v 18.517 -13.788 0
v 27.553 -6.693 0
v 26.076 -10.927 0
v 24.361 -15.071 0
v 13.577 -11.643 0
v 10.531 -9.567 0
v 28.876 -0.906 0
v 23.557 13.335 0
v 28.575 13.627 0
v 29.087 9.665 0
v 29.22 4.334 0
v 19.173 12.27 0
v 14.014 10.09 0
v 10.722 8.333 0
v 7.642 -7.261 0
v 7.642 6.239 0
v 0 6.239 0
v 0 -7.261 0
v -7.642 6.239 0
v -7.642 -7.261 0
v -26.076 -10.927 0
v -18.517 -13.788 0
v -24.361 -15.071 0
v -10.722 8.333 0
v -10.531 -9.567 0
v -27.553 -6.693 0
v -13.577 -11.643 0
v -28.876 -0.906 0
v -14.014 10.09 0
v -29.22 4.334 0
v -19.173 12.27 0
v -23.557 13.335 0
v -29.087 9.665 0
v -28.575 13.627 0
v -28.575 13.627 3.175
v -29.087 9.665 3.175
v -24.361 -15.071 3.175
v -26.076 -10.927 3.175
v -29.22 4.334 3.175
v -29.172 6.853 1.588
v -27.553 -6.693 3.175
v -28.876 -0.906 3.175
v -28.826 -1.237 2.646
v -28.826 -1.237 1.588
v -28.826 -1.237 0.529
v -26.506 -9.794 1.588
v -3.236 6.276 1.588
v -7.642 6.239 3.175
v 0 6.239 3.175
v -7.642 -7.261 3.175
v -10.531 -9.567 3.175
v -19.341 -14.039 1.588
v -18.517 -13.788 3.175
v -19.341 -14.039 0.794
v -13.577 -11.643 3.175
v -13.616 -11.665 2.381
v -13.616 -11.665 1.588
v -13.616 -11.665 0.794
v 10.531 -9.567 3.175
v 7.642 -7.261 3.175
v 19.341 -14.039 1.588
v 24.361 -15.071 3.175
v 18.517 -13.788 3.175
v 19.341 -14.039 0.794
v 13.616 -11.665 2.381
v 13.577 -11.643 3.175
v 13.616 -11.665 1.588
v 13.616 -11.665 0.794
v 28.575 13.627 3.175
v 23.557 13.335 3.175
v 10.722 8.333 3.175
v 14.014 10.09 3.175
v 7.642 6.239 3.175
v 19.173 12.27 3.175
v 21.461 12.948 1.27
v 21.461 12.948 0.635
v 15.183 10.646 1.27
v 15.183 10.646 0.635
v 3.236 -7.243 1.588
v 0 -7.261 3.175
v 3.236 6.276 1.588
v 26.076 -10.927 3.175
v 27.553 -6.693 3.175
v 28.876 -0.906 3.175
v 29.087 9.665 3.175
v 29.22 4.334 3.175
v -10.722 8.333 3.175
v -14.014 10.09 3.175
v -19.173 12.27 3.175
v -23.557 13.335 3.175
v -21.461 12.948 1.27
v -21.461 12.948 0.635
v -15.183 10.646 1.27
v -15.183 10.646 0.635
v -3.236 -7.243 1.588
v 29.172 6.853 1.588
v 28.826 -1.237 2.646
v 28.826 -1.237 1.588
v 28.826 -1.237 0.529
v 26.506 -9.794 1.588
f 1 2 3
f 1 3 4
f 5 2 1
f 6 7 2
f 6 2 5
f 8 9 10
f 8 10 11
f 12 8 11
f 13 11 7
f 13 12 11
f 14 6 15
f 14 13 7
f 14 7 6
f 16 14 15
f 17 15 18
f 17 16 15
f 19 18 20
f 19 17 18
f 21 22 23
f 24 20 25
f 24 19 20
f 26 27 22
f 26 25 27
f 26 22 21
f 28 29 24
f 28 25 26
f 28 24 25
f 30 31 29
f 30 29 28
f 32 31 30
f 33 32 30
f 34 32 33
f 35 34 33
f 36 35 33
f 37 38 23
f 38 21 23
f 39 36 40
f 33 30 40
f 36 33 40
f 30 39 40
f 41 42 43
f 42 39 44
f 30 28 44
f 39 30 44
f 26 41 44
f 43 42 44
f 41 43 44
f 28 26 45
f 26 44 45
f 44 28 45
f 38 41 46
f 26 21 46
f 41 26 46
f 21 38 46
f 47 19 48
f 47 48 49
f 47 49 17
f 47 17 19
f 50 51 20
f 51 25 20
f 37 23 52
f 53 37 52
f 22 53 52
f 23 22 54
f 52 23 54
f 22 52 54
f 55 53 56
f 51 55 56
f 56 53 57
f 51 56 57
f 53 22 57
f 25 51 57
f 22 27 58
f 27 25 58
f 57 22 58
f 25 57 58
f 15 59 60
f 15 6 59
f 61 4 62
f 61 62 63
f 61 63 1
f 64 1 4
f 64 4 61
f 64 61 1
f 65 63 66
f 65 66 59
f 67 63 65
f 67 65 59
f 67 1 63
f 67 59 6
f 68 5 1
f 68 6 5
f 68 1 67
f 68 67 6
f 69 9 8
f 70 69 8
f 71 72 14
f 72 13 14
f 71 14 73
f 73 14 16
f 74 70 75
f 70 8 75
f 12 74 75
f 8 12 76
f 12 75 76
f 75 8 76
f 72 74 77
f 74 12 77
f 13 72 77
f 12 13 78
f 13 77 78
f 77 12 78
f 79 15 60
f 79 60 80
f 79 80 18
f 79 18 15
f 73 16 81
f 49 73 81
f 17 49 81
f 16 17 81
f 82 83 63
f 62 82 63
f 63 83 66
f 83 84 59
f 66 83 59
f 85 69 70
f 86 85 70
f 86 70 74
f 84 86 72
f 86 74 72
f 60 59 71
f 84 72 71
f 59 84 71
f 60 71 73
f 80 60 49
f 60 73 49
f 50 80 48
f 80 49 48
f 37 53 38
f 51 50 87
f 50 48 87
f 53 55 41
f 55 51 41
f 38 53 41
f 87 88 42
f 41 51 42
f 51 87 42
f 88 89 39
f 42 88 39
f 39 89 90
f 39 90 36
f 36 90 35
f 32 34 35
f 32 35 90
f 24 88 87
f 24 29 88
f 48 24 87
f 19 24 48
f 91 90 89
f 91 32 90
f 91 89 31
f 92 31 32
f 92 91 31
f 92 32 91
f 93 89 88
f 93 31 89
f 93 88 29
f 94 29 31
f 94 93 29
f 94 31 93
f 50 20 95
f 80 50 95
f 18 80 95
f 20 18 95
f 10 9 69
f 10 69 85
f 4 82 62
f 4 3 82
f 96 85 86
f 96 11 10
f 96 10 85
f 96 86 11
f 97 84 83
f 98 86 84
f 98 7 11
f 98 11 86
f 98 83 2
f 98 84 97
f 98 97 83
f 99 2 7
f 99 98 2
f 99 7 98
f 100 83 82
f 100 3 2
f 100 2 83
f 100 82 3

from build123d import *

# Parameters (mm, degrees)
BOSS_EXTRUDE1_DEPTH = 3.175


with BuildPart() as part:
    # Sketch1 → Boss-Extrude1 (new body)
    with BuildSketch(Plane.XY):
        with BuildLine():
            Line((0, 6.239472455), (0, -7.260702217))
            add(Edge.make_bspline(
                [(7.641667961, -7.260702217), (6.173224566, -7.24434781), (3.62582692, -7.226650196), (1.078722065, -7.265547409), (0, -7.260702217)],
                knots=[0, 0, 0, 0, 0.576526412, 1, 1, 1, 1], degree=3))
            add(Edge.make_bspline(
                [(24.360647134, -15.070641791), (22.695069181, -14.712846276), (19.912779569, -14.362267459), (16.373231273, -13.013220857), (12.224668447, -11.126379611), (9.579920278, -8.786238347), (7.641667961, -7.260702217)],
                knots=[0, 0, 0, 0, 0.273274261, 0.444400938, 0.60413243, 1, 1, 1, 1], degree=3))
            add(Edge.make_bspline(
                [(28.575, 13.626690141), (29.102161134, 11.397414075), (29.133975743, 7.620513248), (29.291553814, 2.645522958), (28.813043081, -1.975440767), (27.819941332, -6.030249292), (26.247135541, -10.627034403), (25.111702689, -13.327462029), (24.360647134, -15.070641791)],
                knots=[0, 0, 0, 0, 0.230910751, 0.38373302, 0.505873253, 0.702267707, 0.806837053, 1, 1, 1, 1], degree=3))
            add(Edge.make_bspline(
                [(28.575, 13.626690141), (26.199779562, 13.620610297), (22.186719247, 13.420941971), (17.832136903, 11.80420711), (14.646192699, 10.4307062), (11.456721178, 8.801393468), (8.937335742, 7.311275098), (7.641667961, 6.239472455)],
                knots=[0, 0, 0, 0, 0.316578467, 0.524802591, 0.612692342, 0.777335836, 1, 1, 1, 1], degree=3))
            add(Edge.make_bspline(
                [(7.641667961, 6.239472455), (6.172491471, 6.151300055), (3.626276552, 6.357992663), (1.07879149, 6.223497089), (0, 6.239472455)],
                knots=[0, 0, 0, 0, 0.576548234, 1, 1, 1, 1], degree=3))
        make_face()
    boss_extrude1 = extrude(amount=BOSS_EXTRUDE1_DEPTH)

    # Mirror1: Boss-Extrude1 across plane
    add(boss_extrude1.mirror(Plane(origin=(0, 0, 0), x_dir=(0, 0, 1), z_dir=(1, 0, 0))))


solid = part.part
